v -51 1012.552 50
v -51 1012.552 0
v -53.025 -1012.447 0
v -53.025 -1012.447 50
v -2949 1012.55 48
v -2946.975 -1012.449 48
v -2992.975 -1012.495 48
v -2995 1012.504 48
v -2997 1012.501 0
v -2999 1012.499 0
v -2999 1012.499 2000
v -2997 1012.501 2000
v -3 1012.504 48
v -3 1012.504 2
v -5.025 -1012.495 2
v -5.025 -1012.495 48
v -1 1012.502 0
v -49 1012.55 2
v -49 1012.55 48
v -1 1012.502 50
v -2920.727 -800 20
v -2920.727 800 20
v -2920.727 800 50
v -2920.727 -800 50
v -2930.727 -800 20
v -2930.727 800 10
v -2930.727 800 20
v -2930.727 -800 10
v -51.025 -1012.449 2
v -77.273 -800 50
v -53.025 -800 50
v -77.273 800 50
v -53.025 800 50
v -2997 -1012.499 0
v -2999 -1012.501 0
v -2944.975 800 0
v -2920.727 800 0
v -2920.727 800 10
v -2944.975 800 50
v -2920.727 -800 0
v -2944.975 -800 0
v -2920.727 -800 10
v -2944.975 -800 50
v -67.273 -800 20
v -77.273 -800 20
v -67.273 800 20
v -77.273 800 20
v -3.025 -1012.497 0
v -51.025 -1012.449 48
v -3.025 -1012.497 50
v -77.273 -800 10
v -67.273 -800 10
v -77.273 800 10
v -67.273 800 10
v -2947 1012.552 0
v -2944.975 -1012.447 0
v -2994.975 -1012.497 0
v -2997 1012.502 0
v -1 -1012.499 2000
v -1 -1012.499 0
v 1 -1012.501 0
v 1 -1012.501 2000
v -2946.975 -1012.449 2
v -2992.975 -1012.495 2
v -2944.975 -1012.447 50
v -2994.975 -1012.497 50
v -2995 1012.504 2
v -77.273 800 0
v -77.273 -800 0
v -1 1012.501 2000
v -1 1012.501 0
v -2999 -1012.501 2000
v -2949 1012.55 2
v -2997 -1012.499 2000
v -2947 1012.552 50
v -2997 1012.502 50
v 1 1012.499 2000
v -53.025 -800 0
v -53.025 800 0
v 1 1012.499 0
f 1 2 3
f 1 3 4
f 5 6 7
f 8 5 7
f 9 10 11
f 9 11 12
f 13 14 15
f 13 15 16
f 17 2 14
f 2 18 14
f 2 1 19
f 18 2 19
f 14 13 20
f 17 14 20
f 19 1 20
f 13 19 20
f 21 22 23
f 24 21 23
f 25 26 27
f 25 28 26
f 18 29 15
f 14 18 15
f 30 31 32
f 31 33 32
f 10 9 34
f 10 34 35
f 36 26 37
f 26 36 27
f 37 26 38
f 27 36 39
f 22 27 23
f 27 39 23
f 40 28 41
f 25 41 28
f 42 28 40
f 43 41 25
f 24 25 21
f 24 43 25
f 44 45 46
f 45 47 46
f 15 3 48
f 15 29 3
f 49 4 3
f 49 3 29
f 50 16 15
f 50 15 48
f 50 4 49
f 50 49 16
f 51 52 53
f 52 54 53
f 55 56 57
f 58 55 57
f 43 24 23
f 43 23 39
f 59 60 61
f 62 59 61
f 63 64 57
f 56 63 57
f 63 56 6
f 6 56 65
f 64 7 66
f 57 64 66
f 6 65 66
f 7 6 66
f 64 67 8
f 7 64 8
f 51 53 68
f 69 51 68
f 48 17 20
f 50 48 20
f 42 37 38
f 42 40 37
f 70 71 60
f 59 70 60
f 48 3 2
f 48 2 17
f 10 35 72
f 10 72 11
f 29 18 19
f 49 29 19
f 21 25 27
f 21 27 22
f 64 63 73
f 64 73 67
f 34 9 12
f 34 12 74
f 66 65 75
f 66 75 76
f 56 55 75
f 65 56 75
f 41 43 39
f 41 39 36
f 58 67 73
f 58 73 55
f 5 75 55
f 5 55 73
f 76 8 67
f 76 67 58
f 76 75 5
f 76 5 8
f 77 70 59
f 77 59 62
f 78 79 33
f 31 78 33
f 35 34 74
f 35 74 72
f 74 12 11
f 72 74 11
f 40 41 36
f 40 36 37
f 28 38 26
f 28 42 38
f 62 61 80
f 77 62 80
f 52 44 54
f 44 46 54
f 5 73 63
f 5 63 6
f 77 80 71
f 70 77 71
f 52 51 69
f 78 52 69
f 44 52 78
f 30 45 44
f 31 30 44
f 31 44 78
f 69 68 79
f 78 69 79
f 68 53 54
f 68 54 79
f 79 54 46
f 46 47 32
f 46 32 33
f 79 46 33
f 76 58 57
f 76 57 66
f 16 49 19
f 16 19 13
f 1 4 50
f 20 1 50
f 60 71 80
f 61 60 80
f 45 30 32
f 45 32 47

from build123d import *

# Parameters (mm, degrees)
F1_DEPTH = 2000
F2_W     = 50
F2_H     = 50
F2_W_2   = 46
F2_H_2   = 46
F3_DEPTH = 2025
F7_DEPTH = 800


with BuildPart() as f1:
    # F0 (on Top) → F1 (new body)
    with BuildSketch(Plane.XY):
        Polygon((0.999999, 1012.499), (-1, 1012.501), (-1, -1012.499), (0.999999, -1012.501), align=None)
    extrude(amount=F1_DEPTH)


with BuildPart() as f3:
    # F2 (on face) → F3 (new body)
    with BuildSketch(Plane(origin=(-1.012499, -1012.498988, 0), x_dir=(1, -0.001, 0), z_dir=(-0.001, -1, 0))):
        with Locations((-27.012499, 25)):
            Rectangle(F2_W, F2_H)
        with Locations((-27.012499, 25)):
            Rectangle(F2_W_2, F2_H_2, mode=Mode.SUBTRACT)
    extrude(amount=-F3_DEPTH)


with BuildPart() as f5_1:
    # F5: instance of F1
    add(f1.part.mirror(Plane(origin=(-1499.000001, -0.001, 1000), x_dir=(0, 1, 0), z_dir=(1, 0, 0))))


with BuildPart() as f5_2:
    # F5: instance of F3
    add(f3.part.mirror(Plane(origin=(-1499.000001, -0.001, 1000), x_dir=(0, 1, 0), z_dir=(1, 0, 0))))


with BuildPart() as f7:
    # F6 (on Front) → F7 (new body, symmetric)
    with BuildSketch(Plane.XZ):
        Polygon((-53.024972, 0), (-53.024972, 50), (-77.273047, 50), (-77.273047, 20), (-67.273047, 20), (-67.273047, 10), (-77.273047, 10), (-77.273047, 0), align=None)
        Polygon((-2930.726954, 10), (-2930.726954, 20), (-2920.726954, 20), (-2920.726954, 50), (-2944.975029, 50), (-2944.975029, 0), (-2920.726954, 0), (-2920.726954, 10), align=None)
    extrude(amount=F7_DEPTH, both=True)


solid = Compound([f1.part, f3.part, f5_1.part, f5_2.part, f7.part])
